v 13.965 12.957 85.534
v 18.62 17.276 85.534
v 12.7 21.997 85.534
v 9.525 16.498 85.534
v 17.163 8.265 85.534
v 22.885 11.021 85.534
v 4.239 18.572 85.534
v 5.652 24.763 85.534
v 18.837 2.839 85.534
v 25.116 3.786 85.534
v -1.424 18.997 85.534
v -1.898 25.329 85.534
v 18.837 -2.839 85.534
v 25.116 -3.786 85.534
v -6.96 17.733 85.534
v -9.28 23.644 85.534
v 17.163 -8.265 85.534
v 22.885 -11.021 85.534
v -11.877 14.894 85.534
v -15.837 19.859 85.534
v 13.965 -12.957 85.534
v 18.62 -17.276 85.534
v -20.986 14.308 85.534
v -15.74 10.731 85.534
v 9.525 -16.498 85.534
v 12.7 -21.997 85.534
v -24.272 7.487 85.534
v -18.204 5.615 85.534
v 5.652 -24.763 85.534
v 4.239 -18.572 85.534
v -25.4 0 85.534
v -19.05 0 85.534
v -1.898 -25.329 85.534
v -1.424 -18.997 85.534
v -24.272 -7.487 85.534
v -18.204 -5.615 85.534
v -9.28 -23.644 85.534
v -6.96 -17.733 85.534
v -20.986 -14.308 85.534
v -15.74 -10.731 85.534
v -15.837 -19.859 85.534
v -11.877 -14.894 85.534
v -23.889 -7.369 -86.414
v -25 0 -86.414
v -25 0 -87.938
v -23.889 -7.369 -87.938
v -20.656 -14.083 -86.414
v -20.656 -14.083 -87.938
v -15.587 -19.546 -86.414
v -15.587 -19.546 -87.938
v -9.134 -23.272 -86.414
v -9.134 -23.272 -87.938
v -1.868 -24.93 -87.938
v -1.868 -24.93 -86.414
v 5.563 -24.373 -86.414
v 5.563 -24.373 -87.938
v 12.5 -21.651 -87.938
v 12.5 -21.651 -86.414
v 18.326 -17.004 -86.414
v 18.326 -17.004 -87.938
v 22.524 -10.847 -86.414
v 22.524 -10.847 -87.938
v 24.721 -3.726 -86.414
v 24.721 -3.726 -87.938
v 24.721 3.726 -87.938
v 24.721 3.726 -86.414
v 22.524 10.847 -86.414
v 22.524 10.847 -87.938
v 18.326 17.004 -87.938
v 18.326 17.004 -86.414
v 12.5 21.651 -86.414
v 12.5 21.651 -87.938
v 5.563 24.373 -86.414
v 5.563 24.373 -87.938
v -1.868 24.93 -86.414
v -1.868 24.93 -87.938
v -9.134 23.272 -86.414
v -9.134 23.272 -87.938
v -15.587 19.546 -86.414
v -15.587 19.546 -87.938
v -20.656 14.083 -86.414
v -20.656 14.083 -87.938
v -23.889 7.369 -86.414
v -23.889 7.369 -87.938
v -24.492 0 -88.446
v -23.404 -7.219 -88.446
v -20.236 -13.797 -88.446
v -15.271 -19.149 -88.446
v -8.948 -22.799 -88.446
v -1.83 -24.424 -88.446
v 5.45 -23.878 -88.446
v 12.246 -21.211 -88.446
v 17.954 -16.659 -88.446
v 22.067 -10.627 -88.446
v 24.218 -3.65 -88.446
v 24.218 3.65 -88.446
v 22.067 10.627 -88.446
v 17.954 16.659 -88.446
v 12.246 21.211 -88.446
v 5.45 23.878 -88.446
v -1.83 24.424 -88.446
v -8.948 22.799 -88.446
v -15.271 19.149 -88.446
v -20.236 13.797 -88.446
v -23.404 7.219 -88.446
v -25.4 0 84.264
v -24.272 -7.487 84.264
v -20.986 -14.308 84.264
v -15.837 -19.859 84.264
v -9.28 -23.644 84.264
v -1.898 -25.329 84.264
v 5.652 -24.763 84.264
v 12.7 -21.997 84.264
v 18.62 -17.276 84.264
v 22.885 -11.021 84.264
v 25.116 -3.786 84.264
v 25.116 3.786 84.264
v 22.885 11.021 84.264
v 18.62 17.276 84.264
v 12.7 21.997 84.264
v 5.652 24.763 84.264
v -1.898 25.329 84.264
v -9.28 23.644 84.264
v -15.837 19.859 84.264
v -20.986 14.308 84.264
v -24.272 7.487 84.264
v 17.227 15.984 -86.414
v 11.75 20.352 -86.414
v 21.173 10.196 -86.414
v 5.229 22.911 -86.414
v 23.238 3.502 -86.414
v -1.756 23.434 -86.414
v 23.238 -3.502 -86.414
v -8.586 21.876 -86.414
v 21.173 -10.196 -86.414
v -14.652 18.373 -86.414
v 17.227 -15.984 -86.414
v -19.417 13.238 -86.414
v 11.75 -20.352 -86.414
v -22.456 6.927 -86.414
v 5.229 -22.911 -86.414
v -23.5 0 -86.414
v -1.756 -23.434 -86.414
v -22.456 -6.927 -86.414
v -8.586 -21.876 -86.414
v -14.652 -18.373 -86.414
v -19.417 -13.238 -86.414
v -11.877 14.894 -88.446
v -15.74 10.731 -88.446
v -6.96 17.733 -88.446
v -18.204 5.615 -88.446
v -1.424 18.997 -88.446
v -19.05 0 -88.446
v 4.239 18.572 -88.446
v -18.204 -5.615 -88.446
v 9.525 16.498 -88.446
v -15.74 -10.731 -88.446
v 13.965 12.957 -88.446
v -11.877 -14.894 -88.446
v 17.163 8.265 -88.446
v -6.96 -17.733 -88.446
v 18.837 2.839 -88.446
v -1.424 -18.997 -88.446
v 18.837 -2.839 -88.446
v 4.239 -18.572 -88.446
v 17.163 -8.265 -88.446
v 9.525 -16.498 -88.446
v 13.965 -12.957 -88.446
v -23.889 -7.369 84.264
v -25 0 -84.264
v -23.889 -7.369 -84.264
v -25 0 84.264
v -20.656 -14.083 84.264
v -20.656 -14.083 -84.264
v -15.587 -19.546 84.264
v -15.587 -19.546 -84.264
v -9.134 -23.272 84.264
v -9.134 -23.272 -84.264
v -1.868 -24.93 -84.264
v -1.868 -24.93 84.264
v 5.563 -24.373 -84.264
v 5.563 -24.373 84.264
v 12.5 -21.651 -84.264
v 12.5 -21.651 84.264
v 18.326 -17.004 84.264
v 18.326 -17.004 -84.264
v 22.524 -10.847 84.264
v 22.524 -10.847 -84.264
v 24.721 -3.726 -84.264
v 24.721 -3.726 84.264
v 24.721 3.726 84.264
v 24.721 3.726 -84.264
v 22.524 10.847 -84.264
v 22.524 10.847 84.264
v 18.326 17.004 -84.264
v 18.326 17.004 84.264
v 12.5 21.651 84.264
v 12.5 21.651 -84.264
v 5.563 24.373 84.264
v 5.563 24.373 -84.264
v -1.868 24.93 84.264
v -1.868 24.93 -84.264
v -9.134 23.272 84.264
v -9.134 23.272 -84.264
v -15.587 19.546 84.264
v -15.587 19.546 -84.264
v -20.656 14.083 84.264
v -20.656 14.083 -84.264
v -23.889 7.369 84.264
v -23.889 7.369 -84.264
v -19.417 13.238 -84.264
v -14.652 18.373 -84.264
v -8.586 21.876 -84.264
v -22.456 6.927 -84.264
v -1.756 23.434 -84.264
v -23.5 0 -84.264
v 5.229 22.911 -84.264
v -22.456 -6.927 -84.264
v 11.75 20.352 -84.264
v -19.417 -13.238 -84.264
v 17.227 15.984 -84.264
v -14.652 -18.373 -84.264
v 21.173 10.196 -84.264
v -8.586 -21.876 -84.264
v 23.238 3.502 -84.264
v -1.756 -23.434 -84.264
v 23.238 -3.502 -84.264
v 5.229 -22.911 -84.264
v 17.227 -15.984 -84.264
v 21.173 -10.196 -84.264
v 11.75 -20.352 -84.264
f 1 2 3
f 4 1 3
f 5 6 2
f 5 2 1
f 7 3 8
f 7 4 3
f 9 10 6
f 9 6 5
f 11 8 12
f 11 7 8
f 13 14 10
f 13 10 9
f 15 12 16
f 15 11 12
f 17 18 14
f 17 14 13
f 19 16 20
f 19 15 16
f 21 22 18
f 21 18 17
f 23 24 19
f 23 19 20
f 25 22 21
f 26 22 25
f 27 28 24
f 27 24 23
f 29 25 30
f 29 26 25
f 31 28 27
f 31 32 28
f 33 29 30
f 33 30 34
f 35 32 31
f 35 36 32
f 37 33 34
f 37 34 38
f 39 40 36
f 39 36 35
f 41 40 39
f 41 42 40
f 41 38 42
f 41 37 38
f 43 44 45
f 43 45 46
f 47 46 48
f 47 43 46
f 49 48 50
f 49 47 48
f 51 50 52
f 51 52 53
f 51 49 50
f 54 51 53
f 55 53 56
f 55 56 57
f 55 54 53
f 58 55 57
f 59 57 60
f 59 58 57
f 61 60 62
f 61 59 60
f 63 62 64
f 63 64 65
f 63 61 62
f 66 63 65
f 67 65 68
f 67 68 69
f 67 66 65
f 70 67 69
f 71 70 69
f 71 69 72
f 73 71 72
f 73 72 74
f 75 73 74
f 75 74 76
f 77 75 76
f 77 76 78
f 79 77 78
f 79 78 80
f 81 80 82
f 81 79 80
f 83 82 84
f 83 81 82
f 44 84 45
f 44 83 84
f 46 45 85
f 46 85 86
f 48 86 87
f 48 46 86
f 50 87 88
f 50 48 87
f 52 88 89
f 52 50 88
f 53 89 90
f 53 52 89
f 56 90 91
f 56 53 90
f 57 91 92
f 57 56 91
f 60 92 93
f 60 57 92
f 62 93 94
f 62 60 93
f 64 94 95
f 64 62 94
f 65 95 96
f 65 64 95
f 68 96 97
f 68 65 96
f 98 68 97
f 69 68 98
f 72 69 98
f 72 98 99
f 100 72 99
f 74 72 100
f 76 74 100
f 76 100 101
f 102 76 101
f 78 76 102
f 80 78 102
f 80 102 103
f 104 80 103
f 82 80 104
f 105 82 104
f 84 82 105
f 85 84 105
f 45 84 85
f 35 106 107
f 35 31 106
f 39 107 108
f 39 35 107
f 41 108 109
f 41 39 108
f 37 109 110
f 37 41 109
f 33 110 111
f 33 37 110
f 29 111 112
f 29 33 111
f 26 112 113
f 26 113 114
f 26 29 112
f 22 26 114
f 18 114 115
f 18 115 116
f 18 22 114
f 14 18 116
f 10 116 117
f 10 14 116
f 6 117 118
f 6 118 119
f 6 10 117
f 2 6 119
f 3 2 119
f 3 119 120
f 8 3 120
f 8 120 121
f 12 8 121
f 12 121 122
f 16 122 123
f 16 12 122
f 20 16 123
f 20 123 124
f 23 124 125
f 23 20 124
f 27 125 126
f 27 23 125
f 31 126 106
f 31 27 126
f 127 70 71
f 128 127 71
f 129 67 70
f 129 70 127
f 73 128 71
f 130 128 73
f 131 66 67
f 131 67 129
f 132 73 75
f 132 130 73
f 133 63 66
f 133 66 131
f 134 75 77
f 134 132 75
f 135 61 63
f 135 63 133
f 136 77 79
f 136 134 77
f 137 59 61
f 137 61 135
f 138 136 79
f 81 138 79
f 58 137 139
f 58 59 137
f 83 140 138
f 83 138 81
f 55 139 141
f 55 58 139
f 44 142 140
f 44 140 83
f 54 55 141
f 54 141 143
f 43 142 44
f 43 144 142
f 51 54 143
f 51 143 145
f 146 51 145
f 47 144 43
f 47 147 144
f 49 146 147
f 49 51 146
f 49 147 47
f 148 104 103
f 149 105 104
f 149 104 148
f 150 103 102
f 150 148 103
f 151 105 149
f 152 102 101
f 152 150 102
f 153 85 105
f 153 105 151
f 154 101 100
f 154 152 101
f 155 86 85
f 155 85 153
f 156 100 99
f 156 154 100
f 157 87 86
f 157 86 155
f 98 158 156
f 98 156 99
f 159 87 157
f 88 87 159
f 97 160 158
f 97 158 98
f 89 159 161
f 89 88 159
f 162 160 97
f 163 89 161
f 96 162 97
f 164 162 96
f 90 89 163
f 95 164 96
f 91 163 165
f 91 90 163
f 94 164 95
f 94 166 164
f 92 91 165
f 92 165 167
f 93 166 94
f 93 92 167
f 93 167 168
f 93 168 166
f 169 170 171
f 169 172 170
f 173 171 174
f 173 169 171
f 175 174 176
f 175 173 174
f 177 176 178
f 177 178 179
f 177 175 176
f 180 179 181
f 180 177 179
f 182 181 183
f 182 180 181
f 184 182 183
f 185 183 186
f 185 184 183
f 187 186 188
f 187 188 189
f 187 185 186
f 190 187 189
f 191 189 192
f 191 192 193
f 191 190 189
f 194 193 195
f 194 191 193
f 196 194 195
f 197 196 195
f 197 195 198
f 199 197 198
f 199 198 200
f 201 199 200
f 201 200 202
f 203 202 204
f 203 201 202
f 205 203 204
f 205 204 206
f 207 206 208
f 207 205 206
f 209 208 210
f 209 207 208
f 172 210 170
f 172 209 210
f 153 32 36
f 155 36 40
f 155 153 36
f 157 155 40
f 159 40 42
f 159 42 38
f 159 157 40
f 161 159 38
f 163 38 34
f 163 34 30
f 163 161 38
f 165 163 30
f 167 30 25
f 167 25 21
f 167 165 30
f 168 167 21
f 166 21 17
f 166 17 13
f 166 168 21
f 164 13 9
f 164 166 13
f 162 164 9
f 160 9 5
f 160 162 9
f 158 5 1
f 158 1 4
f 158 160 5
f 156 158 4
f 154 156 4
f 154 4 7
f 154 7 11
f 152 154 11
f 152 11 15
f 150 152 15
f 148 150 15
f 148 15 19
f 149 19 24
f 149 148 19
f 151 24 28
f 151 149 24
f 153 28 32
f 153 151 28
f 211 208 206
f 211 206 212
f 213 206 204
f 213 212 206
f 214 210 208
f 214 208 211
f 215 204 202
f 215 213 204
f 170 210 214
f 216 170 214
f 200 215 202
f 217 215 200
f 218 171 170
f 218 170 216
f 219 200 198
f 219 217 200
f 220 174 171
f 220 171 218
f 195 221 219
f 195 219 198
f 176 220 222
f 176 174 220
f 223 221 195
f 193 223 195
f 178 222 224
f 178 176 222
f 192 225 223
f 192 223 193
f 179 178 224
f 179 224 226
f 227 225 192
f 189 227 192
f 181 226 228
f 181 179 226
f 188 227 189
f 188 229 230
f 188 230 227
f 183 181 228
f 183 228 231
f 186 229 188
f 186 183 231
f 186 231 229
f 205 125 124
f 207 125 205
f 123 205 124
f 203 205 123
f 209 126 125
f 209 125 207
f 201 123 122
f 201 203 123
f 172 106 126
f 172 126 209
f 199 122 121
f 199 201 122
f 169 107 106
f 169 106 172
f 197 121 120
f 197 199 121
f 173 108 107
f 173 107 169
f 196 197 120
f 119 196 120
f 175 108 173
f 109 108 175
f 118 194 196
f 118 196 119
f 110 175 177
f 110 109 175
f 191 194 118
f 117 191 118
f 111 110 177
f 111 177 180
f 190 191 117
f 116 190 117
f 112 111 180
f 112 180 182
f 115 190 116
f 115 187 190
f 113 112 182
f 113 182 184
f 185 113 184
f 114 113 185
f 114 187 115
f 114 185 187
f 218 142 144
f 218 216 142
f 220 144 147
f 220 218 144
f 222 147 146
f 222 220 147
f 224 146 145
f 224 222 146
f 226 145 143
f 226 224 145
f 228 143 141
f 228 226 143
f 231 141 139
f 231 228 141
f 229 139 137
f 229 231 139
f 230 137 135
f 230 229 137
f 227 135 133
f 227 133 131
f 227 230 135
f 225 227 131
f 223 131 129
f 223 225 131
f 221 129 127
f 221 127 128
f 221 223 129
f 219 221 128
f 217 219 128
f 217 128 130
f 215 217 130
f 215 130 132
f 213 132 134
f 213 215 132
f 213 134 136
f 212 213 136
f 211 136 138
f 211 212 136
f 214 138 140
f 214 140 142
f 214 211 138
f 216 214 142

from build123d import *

# Parameters (mm, degrees)
CHAMFER1_SIZE = 0.508


with BuildPart() as part:
    # Sketch1 → Revolve1 (revolve)
    with BuildSketch(Plane(origin=(0, 0, 0), x_dir=(0, 0, -1), z_dir=(1, 0, 0)), mode=Mode.PRIVATE) as revolve1_sk:
        Polygon((-85.5345, 19.05), (88.4465, 19.05), (88.4465, 25), (86.4145, 25), (86.4145, 23.5), (84.2645, 23.5), (84.2645, 25), (-84.2645, 25), (-84.2645, 25.4), (-85.5345, 25.4), align=None)
    revolve(revolve1_sk.sketch.rotate(Axis((0, 0, 0), (0, 0, 1)), 90), axis=Axis((0, 0, 0), (0, 0, 1)))

    # Chamfer1
    chamfer1_edges = [part.edges().sort_by_distance(p)[0] for p in [
        (25, 0, -88.4465),
    ]]
    chamfer(chamfer1_edges, length=CHAMFER1_SIZE)


solid = part.part
